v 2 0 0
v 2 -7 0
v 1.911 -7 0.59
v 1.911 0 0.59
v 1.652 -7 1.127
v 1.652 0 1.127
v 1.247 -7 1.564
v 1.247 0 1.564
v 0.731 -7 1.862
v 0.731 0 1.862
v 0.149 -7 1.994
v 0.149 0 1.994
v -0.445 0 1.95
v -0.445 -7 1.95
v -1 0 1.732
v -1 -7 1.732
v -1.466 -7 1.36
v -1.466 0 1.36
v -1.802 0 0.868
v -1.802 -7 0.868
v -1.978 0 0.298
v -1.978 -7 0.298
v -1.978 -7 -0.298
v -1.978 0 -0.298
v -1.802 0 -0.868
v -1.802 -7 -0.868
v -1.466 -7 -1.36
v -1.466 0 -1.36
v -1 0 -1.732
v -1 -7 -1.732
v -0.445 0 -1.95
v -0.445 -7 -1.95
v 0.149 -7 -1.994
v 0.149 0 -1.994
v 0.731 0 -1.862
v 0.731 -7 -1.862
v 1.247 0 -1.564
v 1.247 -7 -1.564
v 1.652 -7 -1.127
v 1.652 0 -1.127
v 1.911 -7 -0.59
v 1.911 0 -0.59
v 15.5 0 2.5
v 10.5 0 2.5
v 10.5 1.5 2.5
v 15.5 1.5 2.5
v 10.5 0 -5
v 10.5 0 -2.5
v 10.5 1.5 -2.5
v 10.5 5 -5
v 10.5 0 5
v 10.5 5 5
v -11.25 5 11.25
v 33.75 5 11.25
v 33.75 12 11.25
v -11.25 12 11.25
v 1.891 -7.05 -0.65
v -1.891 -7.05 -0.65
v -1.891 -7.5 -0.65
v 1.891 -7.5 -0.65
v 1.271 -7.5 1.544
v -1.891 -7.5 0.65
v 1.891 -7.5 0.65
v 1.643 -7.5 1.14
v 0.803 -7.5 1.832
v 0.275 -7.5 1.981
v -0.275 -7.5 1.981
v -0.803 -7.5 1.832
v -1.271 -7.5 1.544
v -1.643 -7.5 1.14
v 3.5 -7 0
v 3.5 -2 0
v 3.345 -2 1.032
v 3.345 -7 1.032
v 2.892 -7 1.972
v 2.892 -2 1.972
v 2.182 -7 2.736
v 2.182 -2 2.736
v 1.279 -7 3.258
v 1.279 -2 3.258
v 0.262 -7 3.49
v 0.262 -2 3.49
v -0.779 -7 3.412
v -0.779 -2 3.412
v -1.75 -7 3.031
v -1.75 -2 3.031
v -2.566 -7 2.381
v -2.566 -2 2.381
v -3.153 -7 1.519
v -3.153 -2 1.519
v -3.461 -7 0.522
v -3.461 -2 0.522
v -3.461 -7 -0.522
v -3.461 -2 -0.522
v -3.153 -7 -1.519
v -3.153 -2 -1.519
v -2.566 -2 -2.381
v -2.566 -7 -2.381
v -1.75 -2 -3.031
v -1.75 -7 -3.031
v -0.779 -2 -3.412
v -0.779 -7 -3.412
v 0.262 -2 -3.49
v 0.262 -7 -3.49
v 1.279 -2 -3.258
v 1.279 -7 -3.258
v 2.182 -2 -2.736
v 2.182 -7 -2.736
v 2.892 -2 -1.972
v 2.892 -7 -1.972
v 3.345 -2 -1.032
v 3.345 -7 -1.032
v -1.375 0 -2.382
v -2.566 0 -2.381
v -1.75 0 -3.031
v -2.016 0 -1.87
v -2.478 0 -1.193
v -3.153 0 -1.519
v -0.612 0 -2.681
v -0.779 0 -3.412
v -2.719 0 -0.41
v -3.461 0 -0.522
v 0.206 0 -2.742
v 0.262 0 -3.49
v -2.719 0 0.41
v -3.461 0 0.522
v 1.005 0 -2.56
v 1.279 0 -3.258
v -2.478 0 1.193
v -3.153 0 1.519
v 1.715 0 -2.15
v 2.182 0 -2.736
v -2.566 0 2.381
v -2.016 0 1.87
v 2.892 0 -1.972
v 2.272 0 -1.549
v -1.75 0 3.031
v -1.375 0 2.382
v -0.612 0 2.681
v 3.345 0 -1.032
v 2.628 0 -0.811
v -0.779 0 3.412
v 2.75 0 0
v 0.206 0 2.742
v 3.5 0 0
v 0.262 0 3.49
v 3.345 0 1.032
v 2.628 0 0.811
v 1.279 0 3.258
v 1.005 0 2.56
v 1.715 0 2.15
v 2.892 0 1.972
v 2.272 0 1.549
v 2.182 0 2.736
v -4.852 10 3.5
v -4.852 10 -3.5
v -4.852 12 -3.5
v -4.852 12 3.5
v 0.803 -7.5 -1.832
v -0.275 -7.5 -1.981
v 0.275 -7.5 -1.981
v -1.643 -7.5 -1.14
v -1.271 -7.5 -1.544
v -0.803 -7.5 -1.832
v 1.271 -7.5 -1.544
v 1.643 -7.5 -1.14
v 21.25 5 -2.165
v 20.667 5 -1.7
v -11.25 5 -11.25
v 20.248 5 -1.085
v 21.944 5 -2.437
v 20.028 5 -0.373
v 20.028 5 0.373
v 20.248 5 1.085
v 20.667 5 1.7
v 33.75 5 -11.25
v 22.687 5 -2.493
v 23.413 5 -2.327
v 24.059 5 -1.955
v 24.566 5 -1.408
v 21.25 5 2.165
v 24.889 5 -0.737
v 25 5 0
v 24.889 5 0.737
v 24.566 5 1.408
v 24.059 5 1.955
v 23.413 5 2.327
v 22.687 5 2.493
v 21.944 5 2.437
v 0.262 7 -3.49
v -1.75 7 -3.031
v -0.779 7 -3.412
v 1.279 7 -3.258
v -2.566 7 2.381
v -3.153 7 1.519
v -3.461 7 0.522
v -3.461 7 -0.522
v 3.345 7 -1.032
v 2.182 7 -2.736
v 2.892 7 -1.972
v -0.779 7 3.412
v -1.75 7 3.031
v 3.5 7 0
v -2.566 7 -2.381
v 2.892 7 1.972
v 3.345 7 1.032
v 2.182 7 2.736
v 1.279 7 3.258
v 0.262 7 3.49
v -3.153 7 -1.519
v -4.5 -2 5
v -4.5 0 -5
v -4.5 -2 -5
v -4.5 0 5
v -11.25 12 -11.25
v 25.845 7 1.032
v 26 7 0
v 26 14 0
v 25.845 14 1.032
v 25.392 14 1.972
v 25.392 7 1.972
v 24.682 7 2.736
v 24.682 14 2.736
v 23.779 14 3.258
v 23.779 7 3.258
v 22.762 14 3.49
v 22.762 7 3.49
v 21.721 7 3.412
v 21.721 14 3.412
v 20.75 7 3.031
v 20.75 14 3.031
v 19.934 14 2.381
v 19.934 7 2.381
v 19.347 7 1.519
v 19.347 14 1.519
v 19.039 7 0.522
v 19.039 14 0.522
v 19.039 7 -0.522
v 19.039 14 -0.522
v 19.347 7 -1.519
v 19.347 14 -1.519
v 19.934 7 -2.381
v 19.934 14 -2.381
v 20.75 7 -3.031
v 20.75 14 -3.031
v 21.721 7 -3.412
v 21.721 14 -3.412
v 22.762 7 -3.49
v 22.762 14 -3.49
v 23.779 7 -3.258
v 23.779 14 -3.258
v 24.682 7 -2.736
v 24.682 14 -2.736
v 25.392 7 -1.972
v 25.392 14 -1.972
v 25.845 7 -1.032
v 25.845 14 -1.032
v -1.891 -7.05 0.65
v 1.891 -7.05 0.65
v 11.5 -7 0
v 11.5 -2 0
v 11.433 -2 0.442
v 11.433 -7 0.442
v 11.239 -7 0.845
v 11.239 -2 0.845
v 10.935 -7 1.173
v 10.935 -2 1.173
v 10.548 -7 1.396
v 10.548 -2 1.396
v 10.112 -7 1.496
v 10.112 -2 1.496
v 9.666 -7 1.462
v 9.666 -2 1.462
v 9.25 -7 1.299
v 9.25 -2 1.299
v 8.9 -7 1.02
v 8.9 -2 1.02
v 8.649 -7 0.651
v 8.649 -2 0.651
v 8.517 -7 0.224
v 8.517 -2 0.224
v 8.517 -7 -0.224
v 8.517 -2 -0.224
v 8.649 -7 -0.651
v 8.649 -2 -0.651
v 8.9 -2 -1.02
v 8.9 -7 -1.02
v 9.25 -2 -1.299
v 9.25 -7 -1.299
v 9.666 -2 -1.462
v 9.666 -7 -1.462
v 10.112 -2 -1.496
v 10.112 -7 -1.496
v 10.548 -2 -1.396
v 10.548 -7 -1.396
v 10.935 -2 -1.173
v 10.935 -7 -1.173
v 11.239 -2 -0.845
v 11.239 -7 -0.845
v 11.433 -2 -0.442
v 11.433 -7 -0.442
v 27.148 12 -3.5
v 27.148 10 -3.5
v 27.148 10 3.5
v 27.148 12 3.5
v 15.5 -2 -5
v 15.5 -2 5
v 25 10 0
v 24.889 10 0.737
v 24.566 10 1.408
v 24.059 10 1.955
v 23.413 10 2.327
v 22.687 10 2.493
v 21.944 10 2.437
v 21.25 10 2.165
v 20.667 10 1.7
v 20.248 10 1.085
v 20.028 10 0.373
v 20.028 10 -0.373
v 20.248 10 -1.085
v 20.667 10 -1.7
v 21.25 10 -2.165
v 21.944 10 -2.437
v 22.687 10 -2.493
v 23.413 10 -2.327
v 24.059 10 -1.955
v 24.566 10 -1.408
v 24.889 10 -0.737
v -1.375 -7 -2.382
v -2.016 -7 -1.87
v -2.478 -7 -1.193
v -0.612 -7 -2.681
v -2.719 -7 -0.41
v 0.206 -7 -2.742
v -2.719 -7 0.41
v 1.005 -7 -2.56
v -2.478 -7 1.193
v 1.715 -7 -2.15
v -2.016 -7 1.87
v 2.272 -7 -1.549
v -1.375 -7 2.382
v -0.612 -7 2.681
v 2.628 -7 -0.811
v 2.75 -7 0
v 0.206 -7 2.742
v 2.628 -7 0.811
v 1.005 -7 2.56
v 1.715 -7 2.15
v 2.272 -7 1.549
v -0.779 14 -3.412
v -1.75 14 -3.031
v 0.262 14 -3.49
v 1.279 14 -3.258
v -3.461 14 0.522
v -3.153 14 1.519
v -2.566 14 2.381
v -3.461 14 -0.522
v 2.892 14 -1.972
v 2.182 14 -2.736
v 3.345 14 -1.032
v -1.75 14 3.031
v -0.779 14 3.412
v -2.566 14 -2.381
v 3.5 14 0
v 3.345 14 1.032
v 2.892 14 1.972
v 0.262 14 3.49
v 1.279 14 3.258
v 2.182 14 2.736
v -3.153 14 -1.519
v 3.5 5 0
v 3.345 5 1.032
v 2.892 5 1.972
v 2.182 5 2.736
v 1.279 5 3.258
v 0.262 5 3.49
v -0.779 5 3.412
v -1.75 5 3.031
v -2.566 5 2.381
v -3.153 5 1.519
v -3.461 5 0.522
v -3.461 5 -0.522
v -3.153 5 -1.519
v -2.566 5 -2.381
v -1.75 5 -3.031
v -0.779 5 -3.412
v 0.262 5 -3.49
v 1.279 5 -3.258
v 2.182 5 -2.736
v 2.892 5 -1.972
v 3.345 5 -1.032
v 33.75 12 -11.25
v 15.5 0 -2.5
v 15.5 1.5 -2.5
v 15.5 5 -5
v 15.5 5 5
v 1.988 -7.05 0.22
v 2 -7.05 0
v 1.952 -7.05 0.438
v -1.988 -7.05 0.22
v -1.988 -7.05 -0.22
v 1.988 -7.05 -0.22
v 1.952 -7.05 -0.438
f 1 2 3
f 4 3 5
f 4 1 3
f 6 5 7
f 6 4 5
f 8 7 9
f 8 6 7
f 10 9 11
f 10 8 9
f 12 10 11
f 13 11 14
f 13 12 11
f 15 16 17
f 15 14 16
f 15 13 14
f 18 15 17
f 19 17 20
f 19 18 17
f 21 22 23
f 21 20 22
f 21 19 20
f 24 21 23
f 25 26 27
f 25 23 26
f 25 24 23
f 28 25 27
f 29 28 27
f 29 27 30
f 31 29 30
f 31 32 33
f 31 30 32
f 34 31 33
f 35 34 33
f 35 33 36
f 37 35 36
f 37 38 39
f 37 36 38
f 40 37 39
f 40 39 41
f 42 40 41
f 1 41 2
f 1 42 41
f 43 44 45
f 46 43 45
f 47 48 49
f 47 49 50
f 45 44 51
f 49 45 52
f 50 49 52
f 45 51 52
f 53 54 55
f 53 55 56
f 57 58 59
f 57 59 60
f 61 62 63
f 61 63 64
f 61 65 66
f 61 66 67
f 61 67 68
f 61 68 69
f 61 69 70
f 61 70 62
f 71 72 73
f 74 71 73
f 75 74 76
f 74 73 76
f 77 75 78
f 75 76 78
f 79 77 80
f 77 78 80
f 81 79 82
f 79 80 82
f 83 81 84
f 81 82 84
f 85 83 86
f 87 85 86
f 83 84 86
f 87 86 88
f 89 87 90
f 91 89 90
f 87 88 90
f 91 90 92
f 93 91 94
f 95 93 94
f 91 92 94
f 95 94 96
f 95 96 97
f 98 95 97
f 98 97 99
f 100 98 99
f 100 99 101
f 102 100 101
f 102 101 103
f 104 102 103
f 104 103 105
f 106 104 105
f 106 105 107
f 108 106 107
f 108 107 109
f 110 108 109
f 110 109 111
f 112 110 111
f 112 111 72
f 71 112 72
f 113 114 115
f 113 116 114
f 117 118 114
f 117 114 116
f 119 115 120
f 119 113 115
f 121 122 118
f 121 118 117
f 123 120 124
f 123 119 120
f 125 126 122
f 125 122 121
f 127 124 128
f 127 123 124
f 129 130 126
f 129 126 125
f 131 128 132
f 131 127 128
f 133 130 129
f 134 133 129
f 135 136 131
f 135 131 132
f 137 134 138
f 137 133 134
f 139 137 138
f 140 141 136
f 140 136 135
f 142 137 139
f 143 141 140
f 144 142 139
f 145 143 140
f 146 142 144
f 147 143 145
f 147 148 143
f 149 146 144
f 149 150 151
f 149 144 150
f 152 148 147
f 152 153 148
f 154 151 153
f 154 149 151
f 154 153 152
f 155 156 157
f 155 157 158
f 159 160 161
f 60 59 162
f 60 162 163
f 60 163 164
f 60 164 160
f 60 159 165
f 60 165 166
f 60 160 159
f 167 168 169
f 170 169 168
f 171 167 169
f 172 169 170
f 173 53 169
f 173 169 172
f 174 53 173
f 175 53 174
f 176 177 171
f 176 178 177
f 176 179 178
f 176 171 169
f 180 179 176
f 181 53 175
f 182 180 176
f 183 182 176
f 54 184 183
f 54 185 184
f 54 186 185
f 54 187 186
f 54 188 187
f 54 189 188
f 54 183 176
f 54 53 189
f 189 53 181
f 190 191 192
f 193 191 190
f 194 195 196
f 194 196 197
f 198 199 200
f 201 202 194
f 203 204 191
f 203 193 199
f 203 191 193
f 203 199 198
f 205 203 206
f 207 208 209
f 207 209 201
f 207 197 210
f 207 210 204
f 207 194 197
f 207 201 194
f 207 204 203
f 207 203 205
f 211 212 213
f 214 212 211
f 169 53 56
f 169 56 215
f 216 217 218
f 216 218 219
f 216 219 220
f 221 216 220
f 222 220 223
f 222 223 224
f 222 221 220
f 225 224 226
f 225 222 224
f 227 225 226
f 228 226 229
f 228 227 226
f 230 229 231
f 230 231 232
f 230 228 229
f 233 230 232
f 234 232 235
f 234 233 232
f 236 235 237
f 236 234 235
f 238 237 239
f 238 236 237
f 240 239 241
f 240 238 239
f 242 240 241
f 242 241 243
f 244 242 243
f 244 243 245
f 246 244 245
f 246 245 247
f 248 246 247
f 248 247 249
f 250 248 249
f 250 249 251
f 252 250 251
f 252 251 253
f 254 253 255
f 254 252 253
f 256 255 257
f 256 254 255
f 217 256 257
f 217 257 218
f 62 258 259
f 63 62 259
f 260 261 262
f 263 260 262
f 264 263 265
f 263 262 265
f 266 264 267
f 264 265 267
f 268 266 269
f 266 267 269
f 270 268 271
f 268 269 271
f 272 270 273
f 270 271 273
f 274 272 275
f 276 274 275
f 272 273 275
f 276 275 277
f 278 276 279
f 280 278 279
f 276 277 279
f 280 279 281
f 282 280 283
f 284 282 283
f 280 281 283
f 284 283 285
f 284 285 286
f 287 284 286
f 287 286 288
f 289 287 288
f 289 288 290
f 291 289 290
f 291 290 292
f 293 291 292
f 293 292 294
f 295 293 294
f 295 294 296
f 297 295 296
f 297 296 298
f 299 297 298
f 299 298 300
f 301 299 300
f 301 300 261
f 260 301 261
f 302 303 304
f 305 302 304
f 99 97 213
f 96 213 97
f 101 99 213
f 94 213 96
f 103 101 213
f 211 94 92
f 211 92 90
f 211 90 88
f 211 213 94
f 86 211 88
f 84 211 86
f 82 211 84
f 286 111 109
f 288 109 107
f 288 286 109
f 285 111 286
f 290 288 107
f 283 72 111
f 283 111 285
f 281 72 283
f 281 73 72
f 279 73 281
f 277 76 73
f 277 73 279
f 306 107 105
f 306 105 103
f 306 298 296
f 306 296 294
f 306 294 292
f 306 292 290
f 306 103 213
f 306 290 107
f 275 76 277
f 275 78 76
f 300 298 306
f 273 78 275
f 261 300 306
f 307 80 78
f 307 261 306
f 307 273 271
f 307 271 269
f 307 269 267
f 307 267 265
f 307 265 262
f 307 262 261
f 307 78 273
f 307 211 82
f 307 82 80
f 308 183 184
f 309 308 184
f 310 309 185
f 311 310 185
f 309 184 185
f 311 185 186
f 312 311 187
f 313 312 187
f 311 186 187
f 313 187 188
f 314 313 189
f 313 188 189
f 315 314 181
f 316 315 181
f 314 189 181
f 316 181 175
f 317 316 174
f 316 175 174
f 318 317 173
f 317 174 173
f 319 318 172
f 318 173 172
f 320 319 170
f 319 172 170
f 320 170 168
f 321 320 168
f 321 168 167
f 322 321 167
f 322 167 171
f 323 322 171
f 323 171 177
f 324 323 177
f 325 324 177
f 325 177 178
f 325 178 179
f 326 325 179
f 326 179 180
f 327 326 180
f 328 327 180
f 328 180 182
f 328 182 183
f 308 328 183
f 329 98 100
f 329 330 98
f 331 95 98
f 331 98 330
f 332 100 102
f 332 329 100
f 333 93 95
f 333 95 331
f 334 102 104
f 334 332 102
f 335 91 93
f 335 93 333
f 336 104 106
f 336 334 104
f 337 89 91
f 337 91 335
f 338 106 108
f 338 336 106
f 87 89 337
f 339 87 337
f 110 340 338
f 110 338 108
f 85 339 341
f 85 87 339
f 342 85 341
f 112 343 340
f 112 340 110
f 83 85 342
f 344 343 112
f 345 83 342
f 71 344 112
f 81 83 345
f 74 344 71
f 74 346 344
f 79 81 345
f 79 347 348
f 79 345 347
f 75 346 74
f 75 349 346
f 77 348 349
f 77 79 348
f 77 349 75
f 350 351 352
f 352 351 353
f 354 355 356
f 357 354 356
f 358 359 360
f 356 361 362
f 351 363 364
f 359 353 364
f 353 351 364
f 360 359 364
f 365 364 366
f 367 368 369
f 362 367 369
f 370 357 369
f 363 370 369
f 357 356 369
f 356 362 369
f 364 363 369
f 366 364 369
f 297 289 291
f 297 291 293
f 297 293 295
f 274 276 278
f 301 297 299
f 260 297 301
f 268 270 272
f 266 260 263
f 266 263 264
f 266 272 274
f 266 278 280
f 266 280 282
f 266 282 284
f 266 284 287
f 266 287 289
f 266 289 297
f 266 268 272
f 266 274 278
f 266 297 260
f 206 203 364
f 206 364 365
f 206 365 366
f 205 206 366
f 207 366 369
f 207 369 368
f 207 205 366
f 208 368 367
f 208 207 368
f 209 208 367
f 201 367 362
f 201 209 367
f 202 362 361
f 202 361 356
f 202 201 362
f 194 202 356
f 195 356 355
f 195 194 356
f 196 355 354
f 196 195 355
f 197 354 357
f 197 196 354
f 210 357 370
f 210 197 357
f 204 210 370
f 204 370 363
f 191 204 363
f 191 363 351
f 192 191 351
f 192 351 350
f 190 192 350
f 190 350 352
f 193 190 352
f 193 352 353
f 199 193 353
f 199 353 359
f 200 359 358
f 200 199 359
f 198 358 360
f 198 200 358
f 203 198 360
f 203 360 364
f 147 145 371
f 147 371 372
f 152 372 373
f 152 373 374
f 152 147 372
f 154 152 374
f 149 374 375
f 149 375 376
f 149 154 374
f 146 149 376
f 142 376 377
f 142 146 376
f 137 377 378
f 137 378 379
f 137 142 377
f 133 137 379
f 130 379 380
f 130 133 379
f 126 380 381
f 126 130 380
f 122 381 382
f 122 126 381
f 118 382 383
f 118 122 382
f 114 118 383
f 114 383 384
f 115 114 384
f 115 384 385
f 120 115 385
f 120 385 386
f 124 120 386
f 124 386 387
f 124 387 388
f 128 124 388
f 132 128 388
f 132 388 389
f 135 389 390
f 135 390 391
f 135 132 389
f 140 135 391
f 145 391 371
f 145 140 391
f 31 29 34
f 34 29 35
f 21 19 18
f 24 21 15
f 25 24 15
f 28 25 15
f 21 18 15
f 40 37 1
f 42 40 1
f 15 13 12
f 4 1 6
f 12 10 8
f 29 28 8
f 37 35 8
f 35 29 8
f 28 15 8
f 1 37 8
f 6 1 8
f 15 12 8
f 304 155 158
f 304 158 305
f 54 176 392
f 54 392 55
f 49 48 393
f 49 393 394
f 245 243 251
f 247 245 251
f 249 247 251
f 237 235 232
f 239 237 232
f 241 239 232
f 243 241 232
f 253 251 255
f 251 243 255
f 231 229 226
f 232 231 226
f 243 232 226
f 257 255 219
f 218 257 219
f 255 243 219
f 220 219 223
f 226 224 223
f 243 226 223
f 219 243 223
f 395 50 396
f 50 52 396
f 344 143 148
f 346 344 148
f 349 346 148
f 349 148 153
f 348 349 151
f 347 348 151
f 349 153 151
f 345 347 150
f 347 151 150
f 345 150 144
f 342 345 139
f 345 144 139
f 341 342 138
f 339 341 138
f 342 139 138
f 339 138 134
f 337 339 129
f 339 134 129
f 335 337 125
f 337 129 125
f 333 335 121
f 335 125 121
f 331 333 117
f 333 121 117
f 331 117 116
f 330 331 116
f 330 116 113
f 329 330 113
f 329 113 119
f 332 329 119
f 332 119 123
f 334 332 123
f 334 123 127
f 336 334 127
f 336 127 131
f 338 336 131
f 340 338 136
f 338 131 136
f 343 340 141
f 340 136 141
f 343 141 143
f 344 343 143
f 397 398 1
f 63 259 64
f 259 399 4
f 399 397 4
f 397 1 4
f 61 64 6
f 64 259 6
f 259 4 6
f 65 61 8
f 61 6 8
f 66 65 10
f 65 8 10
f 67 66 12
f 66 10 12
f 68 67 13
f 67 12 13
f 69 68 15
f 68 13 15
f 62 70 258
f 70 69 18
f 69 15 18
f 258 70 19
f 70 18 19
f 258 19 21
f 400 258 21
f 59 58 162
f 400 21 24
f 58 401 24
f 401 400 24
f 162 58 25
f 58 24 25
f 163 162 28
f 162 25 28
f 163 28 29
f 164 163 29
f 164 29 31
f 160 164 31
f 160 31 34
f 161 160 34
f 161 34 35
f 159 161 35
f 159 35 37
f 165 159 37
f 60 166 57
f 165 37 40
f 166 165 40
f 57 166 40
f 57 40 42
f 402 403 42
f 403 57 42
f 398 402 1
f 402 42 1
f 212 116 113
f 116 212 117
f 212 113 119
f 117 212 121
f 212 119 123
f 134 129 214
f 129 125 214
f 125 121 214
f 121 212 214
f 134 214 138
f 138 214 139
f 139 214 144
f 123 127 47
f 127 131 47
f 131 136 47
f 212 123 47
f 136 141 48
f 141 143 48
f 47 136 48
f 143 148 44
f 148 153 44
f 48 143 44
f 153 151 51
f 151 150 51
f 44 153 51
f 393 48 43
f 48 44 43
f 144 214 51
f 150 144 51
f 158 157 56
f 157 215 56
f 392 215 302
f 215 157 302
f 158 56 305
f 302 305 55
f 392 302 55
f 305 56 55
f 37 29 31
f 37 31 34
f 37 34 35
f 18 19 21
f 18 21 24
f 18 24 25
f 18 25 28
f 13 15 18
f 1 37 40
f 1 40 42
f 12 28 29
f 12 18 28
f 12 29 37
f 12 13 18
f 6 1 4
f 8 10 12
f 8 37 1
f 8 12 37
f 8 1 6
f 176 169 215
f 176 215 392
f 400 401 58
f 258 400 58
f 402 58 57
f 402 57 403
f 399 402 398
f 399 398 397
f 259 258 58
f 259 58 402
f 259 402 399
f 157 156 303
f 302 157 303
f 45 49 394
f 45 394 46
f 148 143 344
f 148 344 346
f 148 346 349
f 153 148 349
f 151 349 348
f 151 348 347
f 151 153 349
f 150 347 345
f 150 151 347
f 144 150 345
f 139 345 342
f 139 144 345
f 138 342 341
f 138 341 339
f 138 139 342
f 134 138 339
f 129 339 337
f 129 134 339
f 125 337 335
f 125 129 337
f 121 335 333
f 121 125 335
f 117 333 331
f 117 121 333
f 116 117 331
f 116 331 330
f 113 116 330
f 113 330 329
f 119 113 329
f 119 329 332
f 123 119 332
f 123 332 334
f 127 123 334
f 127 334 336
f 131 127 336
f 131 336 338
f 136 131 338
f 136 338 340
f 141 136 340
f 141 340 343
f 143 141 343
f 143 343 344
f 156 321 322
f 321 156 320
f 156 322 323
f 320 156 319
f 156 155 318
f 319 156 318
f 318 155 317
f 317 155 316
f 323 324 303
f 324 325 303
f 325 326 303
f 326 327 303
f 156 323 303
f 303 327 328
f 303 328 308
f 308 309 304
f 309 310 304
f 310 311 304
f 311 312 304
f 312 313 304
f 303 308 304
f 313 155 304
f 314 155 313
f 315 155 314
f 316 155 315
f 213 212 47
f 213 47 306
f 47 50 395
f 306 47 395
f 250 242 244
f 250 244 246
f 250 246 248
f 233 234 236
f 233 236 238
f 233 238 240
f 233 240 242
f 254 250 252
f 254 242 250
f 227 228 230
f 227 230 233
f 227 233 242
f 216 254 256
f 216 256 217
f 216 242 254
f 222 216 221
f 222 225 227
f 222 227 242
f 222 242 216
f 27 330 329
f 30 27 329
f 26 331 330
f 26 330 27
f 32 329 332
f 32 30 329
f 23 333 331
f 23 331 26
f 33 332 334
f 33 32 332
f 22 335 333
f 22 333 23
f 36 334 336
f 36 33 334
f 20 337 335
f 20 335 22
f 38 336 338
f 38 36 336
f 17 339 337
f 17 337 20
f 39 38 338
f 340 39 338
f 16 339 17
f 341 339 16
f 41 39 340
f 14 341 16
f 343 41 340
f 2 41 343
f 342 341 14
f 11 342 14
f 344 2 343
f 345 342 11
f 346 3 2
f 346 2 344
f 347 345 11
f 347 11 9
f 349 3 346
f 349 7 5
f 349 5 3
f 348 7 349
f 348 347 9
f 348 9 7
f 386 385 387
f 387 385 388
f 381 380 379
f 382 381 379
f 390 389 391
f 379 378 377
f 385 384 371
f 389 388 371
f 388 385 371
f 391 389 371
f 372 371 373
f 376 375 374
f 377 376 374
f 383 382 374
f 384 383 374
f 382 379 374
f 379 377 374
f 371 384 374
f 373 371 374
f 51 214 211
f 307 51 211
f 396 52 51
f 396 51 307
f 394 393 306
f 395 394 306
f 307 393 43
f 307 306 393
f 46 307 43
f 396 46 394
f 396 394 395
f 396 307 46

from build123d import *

# Parameters (mm, degrees)
F0_R           = 2.75
F1_DEPTH       = 7
F2_R           = 2
F3_DEPTH       = 9.9
F3_DEPTH_BACK  = 12.8
F4_R           = 3.5
F5_DEPTH       = 5
F6_R           = 2
F7_DEPTH       = 7.5
F9_START       = 7.05
F8_W           = 4
F8_H           = 1.3
F9_DEPTH       = 2
F10_W          = 20
F10_H          = 10
F11_DEPTH      = 2
F12_W          = 5
F12_H          = 5
F13_DEPTH      = 5
F14_W          = 1.5
F14_H          = 2.5
F15_DEPTH      = 22.67
F16_R          = 3.5
F16_R_2        = 2.75
F17_DEPTH      = 7
F18_R          = 2.75
F19_DEPTH      = 6.2
F19_DEPTH_BACK = 3.1
F23_START      = -5
F23_DEPTH      = 7
F25_START      = -7
F24_R          = 3.5
F25_DEPTH      = 7
F27_START      = -10
F26_W          = 32
F26_H          = 7
F27_DEPTH      = 15
F20_R          = 1.5
F28_DEPTH      = 7
F29_R          = 2.5
F30_DEPTH      = 10


with BuildPart() as f1:
    # F0 (on Front) → F1 (new body)
    with BuildSketch(Plane.XZ):
        Circle(F0_R)
    extrude(amount=F1_DEPTH)

    # F2 (on Front) → F3 (cut, two sides)
    with BuildSketch(Plane.XZ) as f3_sk:
        Circle(F2_R)
    extrude(amount=F3_DEPTH, mode=Mode.SUBTRACT)
    extrude(f3_sk.sketch, amount=-F3_DEPTH_BACK, mode=Mode.SUBTRACT)

    # F4 (on Front) → F5 (join)
    with BuildSketch(Plane.XZ):
        Circle(F4_R)
    extrude(amount=-F5_DEPTH)


with BuildPart() as f7:
    # F6 (on Front) → F7 (new body)
    with BuildSketch(Plane.XZ):
        Circle(F6_R)
    extrude(amount=F7_DEPTH)

    # F8 (on Front) → F9 (cut)
    with BuildSketch(Plane.XZ.offset(F9_START)):
        Rectangle(F8_W, F8_H)
    extrude(amount=F9_DEPTH, mode=Mode.SUBTRACT)


with BuildPart() as f11:
    # F10 (on Front) → F11 (new body)
    with BuildSketch(Plane.XZ):
        with Locations((5.5, 0)):
            Rectangle(F10_W, F10_H)
    extrude(amount=F11_DEPTH)

    # F12 (on Top) → F13 (join, symmetric)
    with BuildSketch(Plane.XY):
        with Locations((13, 2.5)):
            Rectangle(F12_W, F12_H)
    extrude(amount=F13_DEPTH, both=True)

    # F14 (on Right) → F15 (cut)
    with BuildSketch(Plane.YZ):
        with Locations((0.75, -1.25)):
            Rectangle(F14_W, F14_H)
        with Locations((0.75, 1.25)):
            Rectangle(F14_W, F14_H)
    extrude(amount=F15_DEPTH, mode=Mode.SUBTRACT)

    # F16 (on Front) → F17 (join)
    with BuildSketch(Plane.XZ):
        Circle(F16_R)
        Circle(F16_R_2, mode=Mode.SUBTRACT)
    extrude(amount=F17_DEPTH)

    # F18 (on Front) → F19 (cut, two sides)
    with BuildSketch(Plane.XZ) as f19_sk:
        Circle(F18_R)
    extrude(amount=F19_DEPTH, mode=Mode.SUBTRACT)
    extrude(f19_sk.sketch, amount=-F19_DEPTH_BACK, mode=Mode.SUBTRACT)

    # F20 (on Front) → F28 (join)
    with BuildSketch(Plane.XZ):
        with Locations((10, 0)):
            Circle(F20_R)
    extrude(amount=F28_DEPTH)


with BuildPart() as f23:
    # F22 (on Front) → F23 (new body)
    with BuildSketch(Plane.XZ.offset(F23_START)):
        Polygon((33.75, 11.25), (11.25, 11.25), (-11.25, 11.25), (-11.25, -11.25), (11.25, -11.25), (33.75, -11.25), align=None)
    extrude(amount=-F23_DEPTH)

    # F26 (on Front) → F27 (cut)
    with BuildSketch(Plane.XZ.offset(F27_START)):
        with Locations((11.1485, 0)):
            Rectangle(F26_W, F26_H)
    extrude(amount=-F27_DEPTH, mode=Mode.SUBTRACT)

    # F29 (on Front) → F30 (cut)
    with BuildSketch(Plane.XZ):
        with Locations((22.5, 0)):
            Circle(F29_R)
    extrude(amount=-F30_DEPTH, mode=Mode.SUBTRACT)


with BuildPart() as f25:
    # F24 (on Front) → F25 (new body)
    with BuildSketch(Plane.XZ.offset(F25_START)):
        Circle(F24_R)
    extrude(amount=-F25_DEPTH)


with BuildPart() as f25b:
    # F24 (on Front) → F25, piece 2 (new body)
    with BuildSketch(Plane.XZ.offset(F25_START)):
        with Locations((22.5, 0)):
            Circle(F24_R)
    extrude(amount=-F25_DEPTH)


solid = Compound([f1.part, f7.part, f11.part, f23.part, f25.part, f25b.part])
